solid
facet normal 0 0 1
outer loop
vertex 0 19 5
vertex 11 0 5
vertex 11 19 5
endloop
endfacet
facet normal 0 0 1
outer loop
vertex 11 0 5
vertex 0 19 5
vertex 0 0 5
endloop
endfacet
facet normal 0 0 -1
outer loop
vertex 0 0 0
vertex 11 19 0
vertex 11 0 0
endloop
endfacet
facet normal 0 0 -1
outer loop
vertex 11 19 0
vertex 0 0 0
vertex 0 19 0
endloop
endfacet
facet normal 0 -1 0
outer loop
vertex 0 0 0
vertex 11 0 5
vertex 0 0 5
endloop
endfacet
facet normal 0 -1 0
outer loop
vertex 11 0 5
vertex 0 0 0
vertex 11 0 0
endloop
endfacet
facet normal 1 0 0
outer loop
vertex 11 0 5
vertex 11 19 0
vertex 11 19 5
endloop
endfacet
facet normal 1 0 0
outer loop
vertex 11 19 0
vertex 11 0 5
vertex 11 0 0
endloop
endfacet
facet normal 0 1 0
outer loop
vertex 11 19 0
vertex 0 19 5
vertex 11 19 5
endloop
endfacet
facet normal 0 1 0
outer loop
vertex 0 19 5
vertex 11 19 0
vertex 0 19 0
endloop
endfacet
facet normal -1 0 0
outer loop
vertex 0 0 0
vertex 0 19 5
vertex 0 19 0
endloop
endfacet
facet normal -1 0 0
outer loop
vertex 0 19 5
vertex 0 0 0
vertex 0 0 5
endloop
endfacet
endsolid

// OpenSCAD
// Generated by SolidPython 1.0.1 on 2020-07-29 00:46:55


cube(size = [11, 19, 5]);
/***********************************************
*********      SolidPython code:      **********
************************************************
 
# import packages: SolidPython
from solid import *
from solid.utils import *
from itertools import chain, combinations, permutations


class Resize:

    def __init__(self, scad_file):
        self.scad_file = scad_file
        #self.scad_file = import_scad(scad_file)
        # cone/cylinder param:
        self.r1 = 0
        self.r2 = 0
        self.h = 0
        # rectangular prism param:
        self.w = 0
        self.l = 0
        # ellipse param:
        self.r = 0

    # import OpenScad code (file name corresponds to shape)


    # classify shape + parameters
    def assign(self, param1, param2, param3):
        if self.scad_file == 'cone.scad':
            self.r1 = param1
            self.r2 = param2
            self.h = param3
        elif self.scad_file == 'cylinder.scad':
            self.r1 = param1
            self.r2 = param2
            self.h = param3
        elif self.scad_file == 'rectangularPrism.scad':
            self.h = param1
            self.l = param2
            self.w = param3
        else:
            self.r = param1
            self.h = param2

    # resize parameters
    def iterate(self):
        x = range(3, 20, 2)
        i = 1
        if self.scad_file == 'cone.scad':
            tempList = list(permutations(x, 2))
            for temp in tempList:
                param1 = temp[0]
                param2 = temp[1]
                filepath = 'produced_scad_files/' + 'cone' + str(param1) + '_' + str(param2) + '_' + '.scad'
                scad_render_to_file(cylinder(h=param1, r1=param2, r2=0), filepath)

        elif self.scad_file == 'cylinder.scad':
            tempList = list(permutations(x, 3))
            for temp in tempList:
                param1 = temp[0]
                param2 = temp[1]
                filepath = 'produced_scad_files/' + 'cylinder' + str(param1) + '_' + str(param2) + '_' + '.scad'
                scad_render_to_file(cylinder(h=param1, r1=param2, r2=param2), filepath)

        elif self.scad_file == 'rectangularPrism.scad':
            tempList = list(permutations(x, 3))
            for temp in tempList:
                param1 = temp[0]
                param2 = temp[1]
                param3 = temp[2]
                filepath = 'produced_scad_files/' + 'rectangularPrism' + str(param1) + '_' + str(param2) + '_' + str(
                    param3) + '.scad'
                scad_render_to_file(cube(size=(param1, param2, param3)), filepath)

        elif self.scad_file == 'ellipse.scad':
            tempList = list(permutations(x, 4))
            for temp in tempList:
                param1 = temp[0]
                param2 = temp[1]
                param3 = temp[2]
                param4 = temp[3]
                filepath = 'produced_scad_files/' + 'ellipse' + str(param1) + '_' + str(param2) + '_' + str(param3) + '_' + str(param4) + '.scad'
                scad_render_to_file(scale([param1, param2, param3])(sphere(r=param4)), filepath)

    def render_to_scadfile(self):
        scad_render_to_file(scad, 'example.scad') 
 
************************************************/
